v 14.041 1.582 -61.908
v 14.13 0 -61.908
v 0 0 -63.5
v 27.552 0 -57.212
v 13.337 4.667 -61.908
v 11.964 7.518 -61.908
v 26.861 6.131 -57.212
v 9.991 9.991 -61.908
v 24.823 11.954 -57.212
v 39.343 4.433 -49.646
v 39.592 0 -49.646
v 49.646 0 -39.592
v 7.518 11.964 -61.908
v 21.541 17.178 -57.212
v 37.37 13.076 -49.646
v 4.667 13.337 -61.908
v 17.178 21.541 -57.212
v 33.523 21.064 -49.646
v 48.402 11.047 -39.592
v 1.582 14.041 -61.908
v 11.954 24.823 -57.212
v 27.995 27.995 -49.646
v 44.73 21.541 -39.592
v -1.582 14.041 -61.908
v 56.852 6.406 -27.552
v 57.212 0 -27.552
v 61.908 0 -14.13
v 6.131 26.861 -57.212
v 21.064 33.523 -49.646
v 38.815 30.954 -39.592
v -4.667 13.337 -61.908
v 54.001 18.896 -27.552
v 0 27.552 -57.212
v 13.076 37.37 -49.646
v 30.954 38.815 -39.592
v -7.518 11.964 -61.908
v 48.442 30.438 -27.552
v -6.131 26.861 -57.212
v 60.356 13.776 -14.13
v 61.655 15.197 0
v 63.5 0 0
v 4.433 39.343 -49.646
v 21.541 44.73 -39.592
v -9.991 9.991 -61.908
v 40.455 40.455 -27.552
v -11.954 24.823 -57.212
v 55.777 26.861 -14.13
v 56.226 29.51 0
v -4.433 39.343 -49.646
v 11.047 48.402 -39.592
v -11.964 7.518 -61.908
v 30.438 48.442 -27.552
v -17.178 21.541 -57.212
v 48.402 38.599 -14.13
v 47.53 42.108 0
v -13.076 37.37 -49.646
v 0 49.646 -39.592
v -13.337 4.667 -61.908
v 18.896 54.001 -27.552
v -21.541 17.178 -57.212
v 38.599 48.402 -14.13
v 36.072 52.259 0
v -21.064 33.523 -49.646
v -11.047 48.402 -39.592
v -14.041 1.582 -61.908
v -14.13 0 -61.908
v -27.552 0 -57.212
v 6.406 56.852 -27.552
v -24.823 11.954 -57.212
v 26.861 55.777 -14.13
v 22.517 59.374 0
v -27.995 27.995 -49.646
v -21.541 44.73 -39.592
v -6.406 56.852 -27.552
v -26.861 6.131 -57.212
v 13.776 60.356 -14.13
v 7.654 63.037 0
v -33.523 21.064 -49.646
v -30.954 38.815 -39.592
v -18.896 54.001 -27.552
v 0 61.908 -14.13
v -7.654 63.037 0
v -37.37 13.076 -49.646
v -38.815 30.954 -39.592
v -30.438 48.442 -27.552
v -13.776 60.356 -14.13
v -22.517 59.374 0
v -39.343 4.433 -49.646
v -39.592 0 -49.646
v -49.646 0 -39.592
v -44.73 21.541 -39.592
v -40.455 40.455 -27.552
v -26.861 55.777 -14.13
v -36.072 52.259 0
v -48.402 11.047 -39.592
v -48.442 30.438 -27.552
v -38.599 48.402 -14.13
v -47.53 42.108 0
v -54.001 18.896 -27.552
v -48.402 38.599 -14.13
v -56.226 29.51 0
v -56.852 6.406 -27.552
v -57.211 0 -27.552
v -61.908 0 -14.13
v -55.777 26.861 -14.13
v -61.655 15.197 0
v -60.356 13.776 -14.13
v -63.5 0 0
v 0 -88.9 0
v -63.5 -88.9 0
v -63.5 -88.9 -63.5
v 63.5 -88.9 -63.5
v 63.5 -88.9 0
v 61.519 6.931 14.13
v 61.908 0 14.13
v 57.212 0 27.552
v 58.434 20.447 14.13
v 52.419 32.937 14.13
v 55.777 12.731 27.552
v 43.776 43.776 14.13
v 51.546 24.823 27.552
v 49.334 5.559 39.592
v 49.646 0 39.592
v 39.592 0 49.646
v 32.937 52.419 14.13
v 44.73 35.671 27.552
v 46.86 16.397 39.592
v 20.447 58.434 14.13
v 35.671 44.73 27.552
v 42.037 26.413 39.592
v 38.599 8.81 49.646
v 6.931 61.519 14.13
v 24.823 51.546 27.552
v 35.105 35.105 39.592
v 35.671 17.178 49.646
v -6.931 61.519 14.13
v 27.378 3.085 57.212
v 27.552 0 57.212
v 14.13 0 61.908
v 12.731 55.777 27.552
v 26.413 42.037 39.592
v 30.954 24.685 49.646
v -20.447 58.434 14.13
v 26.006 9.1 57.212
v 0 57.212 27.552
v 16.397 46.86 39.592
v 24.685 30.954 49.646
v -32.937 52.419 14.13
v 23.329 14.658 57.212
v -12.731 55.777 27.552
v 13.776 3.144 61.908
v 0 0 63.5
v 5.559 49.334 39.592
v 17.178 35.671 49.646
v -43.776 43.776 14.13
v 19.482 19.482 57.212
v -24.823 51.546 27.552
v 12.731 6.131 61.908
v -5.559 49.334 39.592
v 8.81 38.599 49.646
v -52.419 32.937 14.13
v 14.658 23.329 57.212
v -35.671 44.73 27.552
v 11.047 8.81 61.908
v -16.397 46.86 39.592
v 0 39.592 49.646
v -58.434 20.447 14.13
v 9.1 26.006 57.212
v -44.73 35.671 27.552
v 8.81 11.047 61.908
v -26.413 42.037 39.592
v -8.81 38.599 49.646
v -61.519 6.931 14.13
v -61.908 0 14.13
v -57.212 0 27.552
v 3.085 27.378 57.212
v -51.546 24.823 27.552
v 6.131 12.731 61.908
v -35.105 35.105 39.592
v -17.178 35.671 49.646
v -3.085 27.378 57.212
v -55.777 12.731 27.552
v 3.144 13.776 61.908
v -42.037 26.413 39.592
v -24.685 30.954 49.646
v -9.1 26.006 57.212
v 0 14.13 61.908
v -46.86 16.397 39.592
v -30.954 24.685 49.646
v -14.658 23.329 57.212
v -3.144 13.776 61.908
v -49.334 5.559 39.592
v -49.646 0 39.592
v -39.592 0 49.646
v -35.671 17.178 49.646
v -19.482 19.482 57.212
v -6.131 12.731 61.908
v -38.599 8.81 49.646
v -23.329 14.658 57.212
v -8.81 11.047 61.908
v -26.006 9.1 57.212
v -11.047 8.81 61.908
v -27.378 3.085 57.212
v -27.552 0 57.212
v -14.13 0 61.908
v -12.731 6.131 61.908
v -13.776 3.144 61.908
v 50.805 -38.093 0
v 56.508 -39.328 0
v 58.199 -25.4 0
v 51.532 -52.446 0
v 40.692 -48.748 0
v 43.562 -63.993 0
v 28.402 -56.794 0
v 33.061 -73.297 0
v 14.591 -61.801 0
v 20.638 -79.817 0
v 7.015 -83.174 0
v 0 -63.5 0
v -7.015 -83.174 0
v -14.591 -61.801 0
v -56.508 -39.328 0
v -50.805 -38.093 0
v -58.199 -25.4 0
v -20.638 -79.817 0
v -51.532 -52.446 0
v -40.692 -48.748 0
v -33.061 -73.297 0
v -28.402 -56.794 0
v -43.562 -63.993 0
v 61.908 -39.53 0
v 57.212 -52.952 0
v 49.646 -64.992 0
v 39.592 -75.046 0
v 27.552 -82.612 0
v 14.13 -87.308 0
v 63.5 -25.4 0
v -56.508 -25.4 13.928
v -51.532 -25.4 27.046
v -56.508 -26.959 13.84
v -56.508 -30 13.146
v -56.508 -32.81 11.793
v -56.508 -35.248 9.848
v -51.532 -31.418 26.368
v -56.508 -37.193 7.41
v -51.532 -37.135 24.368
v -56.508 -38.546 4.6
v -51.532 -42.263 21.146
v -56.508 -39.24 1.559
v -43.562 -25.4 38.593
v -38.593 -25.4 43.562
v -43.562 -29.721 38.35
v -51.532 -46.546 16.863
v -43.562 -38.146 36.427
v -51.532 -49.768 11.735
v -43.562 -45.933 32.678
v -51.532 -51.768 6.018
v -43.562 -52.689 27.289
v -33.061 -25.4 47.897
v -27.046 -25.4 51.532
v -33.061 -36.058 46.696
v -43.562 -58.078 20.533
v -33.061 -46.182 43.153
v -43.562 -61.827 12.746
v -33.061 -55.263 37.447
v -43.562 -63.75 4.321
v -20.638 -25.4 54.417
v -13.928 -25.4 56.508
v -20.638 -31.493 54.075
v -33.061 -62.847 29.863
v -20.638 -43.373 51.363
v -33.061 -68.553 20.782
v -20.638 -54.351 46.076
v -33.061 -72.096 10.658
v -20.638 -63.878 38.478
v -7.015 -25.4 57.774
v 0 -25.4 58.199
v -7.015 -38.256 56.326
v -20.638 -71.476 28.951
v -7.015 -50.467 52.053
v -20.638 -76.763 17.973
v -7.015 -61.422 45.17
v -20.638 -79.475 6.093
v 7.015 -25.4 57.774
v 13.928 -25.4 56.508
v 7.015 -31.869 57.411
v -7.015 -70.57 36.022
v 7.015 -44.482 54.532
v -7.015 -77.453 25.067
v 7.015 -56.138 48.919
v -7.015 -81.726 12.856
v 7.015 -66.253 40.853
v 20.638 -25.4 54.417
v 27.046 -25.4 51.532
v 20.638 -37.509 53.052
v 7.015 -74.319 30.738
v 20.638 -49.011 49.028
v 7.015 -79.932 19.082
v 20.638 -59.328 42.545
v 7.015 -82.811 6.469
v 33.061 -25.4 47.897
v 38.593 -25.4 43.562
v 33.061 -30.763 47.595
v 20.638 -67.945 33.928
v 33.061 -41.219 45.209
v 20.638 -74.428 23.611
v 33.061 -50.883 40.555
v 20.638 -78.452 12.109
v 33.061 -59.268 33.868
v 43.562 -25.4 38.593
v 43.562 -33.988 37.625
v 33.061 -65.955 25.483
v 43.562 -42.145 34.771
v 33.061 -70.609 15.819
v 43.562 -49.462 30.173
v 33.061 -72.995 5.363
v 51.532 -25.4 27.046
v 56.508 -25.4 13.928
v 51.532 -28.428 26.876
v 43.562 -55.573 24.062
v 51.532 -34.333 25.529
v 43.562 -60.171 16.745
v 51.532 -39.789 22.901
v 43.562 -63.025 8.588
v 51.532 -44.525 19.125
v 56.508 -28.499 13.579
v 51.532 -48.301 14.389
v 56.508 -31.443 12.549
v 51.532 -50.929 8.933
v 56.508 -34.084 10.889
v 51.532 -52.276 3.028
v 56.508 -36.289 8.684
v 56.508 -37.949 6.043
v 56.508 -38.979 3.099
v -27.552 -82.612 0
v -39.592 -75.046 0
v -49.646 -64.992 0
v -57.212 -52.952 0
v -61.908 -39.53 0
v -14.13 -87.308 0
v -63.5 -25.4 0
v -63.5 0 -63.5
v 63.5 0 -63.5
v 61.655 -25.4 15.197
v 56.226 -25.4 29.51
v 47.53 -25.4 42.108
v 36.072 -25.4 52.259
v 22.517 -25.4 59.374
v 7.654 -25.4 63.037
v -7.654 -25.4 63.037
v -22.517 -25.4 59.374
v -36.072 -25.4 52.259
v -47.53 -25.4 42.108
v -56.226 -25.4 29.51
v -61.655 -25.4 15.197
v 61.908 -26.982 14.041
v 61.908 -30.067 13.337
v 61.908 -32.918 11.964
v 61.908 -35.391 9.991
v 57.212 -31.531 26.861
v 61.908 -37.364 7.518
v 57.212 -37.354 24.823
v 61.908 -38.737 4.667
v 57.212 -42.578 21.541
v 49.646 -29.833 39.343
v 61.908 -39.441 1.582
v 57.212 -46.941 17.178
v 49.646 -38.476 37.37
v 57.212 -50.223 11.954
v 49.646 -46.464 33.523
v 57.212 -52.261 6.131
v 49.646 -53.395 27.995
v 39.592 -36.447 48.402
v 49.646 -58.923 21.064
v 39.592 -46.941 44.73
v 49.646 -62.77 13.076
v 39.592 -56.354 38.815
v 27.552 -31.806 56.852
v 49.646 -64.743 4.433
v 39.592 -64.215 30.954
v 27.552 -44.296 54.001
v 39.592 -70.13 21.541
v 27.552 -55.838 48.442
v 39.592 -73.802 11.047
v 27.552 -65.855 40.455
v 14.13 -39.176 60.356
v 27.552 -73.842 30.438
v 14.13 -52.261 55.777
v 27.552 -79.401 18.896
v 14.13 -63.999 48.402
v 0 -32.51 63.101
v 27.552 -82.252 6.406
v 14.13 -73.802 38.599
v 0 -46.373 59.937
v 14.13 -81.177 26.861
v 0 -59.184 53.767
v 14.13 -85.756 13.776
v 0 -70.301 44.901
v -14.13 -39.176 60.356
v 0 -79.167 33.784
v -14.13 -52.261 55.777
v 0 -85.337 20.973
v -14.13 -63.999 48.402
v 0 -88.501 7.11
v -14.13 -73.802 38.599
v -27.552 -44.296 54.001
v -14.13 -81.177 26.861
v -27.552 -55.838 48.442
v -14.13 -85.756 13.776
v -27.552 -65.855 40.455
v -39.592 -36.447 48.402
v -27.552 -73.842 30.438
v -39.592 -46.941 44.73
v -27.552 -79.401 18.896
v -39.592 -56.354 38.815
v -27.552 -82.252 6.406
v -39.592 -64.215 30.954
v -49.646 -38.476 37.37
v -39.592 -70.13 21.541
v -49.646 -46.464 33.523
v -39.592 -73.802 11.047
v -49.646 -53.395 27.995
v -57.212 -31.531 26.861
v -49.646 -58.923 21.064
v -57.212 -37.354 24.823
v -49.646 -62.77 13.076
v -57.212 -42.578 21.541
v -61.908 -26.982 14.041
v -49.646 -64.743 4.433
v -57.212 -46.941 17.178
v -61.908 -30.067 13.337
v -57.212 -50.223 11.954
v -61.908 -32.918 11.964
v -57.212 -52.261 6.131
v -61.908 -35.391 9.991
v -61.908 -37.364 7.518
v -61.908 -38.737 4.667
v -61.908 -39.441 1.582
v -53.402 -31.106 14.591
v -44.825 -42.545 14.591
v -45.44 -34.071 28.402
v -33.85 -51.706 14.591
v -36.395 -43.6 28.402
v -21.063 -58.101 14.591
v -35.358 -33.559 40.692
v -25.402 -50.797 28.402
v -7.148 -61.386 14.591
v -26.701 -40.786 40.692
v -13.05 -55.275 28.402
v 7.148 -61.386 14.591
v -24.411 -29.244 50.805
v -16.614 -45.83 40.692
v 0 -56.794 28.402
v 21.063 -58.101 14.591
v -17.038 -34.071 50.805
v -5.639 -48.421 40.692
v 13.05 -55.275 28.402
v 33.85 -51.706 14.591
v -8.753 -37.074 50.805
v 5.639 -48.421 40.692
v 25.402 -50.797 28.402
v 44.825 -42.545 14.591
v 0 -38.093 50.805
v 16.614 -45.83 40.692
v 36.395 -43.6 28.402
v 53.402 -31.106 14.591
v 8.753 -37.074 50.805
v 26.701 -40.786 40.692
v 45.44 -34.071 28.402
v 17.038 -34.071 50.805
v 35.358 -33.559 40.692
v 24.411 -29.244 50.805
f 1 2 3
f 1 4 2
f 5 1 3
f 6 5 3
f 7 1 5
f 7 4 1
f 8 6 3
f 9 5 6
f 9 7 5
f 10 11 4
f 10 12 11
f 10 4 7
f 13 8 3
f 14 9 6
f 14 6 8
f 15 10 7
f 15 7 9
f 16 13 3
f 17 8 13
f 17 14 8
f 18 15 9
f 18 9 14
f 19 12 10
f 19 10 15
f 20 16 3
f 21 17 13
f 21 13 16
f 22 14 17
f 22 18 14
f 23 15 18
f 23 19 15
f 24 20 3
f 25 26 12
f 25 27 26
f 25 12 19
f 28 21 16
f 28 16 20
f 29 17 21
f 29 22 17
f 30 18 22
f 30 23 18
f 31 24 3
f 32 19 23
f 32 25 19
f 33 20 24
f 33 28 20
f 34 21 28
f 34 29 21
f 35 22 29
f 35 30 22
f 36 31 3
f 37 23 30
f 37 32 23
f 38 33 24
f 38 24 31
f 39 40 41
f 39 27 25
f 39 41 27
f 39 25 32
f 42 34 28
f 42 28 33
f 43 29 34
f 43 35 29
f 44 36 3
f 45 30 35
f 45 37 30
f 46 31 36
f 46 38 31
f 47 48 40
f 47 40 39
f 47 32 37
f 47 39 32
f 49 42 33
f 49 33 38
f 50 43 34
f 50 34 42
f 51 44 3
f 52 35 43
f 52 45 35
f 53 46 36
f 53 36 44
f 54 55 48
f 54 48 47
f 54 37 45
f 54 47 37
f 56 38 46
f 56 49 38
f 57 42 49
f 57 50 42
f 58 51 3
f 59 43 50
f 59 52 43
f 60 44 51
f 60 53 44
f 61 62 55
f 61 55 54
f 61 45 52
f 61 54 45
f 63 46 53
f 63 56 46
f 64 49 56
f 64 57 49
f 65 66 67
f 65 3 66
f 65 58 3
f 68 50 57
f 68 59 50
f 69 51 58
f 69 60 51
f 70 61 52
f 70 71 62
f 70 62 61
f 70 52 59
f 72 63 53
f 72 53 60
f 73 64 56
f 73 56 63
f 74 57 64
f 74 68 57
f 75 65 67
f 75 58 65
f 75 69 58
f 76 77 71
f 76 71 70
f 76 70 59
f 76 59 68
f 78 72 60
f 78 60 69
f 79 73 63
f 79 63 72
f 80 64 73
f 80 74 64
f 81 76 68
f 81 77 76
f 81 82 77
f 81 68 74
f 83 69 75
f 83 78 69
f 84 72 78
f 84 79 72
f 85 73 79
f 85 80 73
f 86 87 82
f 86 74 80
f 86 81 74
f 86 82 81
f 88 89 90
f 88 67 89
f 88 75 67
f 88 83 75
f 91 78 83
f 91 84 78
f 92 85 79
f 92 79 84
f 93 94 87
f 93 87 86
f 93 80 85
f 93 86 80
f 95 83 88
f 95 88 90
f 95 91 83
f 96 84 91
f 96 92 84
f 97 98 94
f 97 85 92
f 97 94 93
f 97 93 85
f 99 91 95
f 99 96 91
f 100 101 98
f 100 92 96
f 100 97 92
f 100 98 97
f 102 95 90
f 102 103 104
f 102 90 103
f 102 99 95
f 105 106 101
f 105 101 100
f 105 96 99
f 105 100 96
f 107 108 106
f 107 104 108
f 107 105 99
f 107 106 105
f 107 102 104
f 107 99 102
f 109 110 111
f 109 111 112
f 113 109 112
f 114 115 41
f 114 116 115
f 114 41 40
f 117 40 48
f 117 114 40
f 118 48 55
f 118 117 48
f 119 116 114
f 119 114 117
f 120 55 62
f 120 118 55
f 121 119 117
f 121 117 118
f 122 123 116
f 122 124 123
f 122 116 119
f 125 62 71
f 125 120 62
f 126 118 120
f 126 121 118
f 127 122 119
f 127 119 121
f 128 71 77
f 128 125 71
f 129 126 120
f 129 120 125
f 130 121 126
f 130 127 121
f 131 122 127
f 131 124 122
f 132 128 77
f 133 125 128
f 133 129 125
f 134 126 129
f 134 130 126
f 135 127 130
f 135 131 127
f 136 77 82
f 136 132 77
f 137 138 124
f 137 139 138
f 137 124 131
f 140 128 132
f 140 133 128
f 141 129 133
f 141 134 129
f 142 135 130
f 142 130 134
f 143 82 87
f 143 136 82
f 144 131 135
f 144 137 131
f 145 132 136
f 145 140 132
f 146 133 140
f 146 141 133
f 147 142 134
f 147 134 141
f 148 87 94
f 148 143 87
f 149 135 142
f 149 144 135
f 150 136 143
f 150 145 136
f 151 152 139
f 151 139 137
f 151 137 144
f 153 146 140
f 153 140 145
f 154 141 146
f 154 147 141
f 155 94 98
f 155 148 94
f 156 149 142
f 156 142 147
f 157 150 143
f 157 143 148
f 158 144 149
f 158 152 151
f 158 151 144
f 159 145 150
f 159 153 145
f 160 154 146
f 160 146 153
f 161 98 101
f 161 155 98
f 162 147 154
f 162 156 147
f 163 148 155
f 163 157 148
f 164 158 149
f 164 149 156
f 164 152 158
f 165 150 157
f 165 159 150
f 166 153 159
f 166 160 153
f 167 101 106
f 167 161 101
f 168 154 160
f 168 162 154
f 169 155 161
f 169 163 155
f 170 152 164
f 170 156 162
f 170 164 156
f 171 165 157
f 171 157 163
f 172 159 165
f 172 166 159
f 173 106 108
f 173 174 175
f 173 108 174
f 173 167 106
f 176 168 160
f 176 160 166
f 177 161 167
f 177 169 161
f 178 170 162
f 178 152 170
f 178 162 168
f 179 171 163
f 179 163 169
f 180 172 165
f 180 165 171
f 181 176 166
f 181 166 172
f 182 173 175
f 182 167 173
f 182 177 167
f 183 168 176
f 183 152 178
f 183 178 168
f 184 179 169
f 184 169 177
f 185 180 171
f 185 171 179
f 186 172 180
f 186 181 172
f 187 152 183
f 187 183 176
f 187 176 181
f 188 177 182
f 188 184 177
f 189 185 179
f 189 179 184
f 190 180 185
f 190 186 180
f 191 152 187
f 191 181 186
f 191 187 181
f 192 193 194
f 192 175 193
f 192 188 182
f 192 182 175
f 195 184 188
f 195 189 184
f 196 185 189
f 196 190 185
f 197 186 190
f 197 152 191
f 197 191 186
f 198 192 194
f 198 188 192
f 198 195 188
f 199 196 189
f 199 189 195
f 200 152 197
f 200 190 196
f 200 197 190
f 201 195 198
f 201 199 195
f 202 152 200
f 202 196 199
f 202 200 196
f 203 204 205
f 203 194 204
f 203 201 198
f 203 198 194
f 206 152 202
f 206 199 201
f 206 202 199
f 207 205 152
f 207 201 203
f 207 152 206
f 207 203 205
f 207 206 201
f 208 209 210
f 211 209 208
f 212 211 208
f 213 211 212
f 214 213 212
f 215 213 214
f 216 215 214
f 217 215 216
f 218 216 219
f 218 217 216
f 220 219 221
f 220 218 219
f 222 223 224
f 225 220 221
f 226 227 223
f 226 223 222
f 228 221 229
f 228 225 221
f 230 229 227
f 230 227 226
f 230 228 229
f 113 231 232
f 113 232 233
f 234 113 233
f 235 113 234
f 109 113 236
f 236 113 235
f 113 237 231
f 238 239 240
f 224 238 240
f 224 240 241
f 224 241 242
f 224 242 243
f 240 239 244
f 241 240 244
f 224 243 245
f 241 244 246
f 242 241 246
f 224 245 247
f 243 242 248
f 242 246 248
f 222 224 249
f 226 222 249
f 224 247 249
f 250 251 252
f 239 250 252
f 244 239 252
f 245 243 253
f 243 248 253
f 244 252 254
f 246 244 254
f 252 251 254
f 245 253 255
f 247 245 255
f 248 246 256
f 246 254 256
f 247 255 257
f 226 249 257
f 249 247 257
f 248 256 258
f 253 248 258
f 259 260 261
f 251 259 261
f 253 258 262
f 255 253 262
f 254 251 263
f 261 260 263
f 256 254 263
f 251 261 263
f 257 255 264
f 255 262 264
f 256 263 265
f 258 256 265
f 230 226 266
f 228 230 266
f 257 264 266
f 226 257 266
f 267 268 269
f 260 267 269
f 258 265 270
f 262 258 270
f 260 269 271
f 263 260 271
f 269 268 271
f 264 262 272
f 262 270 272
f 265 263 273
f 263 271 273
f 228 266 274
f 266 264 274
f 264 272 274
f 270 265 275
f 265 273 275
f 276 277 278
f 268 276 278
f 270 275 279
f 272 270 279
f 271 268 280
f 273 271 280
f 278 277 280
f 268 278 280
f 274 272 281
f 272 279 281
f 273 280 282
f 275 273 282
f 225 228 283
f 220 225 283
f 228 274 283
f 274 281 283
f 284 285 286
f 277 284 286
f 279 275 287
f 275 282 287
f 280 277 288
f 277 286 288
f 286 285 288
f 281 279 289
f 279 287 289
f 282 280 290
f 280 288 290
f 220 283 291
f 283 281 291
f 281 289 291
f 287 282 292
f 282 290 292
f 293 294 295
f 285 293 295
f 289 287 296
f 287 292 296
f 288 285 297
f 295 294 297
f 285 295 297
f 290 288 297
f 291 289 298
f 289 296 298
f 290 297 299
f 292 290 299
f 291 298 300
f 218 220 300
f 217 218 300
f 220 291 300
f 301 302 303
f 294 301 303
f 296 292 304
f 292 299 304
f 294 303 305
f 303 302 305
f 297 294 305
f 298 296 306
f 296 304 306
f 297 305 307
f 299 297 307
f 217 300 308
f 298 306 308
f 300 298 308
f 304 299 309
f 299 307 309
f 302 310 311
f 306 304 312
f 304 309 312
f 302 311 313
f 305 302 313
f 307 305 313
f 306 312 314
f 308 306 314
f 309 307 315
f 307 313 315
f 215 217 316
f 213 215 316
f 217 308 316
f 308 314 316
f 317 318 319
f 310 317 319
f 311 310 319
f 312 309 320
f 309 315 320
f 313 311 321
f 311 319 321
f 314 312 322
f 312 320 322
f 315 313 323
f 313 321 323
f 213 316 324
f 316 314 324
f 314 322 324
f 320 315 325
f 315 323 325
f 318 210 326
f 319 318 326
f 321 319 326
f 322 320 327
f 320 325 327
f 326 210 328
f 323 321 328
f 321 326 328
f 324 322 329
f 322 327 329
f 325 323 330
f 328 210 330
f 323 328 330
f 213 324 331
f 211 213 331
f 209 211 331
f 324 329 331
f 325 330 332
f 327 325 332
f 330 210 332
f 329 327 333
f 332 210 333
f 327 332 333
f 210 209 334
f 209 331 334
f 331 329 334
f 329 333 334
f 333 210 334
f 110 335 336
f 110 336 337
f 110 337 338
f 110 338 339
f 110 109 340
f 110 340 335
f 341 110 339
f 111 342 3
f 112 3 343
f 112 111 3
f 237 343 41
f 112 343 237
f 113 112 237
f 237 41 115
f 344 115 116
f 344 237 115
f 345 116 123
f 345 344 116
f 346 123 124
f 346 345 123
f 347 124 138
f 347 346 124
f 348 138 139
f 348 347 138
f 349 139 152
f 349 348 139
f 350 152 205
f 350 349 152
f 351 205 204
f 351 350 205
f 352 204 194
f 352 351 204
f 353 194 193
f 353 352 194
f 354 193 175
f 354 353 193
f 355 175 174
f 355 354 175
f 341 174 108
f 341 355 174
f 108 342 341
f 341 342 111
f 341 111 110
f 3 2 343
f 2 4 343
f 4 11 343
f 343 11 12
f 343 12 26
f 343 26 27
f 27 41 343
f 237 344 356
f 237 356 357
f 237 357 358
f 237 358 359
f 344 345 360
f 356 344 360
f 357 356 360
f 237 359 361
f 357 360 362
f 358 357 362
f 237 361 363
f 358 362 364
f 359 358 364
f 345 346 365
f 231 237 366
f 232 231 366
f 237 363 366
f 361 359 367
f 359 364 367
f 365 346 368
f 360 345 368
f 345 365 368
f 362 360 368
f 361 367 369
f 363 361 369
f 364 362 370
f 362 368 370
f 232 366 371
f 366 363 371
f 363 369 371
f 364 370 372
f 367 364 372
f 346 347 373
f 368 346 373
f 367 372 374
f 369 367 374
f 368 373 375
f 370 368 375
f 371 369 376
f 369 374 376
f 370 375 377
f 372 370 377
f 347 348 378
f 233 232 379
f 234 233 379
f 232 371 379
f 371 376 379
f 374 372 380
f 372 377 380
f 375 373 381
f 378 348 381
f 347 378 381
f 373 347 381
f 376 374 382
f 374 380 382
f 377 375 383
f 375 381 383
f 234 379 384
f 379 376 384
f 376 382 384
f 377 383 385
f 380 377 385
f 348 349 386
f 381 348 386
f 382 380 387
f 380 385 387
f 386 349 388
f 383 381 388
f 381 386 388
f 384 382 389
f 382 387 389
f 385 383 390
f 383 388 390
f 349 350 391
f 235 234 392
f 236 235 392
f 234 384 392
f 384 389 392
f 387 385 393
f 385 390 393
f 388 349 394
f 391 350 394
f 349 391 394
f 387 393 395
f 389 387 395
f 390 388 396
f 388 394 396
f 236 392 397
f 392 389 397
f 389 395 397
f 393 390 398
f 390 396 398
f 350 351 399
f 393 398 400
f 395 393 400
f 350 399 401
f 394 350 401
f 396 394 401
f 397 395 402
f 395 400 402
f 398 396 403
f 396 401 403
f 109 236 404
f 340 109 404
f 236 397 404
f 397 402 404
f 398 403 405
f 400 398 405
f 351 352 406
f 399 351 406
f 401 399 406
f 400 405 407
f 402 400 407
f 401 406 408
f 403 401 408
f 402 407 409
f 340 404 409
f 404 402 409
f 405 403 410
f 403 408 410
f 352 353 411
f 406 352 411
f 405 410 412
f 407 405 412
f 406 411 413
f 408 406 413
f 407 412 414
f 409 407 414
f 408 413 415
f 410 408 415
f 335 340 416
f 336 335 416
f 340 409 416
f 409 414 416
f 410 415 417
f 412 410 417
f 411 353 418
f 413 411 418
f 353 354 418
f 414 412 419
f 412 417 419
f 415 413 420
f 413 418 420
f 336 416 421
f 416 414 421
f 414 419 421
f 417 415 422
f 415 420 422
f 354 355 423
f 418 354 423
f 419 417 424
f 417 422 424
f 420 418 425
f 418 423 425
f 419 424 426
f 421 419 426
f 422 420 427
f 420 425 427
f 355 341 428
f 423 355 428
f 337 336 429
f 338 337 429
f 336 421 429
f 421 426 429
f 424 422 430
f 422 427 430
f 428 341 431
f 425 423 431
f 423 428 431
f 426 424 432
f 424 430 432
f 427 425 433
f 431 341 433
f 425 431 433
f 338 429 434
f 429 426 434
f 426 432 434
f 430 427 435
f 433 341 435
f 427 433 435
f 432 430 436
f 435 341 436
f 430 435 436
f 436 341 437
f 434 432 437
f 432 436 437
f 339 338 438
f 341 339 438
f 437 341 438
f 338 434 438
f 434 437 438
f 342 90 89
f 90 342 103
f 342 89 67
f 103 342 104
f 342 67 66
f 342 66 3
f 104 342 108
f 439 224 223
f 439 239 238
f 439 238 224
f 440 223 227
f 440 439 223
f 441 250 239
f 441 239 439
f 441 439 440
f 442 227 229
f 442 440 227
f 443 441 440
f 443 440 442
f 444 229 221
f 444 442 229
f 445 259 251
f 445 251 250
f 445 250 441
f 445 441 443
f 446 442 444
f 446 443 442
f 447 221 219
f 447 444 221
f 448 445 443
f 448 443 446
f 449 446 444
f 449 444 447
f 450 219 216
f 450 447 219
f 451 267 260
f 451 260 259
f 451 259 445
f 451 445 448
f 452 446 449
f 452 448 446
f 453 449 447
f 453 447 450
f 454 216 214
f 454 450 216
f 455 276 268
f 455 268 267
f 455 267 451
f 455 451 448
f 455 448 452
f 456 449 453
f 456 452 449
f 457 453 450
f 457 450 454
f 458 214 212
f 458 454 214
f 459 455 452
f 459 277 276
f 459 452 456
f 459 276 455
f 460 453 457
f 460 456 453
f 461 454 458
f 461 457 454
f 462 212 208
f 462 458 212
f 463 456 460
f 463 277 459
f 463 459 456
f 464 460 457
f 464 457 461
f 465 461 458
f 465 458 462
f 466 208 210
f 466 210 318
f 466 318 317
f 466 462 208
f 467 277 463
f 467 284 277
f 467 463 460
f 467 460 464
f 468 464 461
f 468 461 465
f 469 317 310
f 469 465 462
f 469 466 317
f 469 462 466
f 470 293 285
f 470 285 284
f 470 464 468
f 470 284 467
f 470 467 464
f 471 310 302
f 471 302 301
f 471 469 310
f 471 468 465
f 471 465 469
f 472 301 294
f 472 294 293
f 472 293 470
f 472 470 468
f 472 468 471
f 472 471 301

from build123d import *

# Parameters (mm, degrees)
F4_DEPTH = 25.4
F5_ANGLE = 90
F7_W     = 63.5
F7_H     = 63.5
F8_DEPTH = 88.9


with BuildPart() as f1:
    # F0 (on Front) → F1 (revolve)
    with BuildSketch(Plane.XZ):
        with BuildLine():
            Line((0, 63.5), (0, -63.5))
            ThreePointArc((0, -63.5), (44.9012806053, -44.9012806053), (63.5, 0))
            ThreePointArc((63.5, 0), (44.9012806053, 44.9012806053), (0, 63.5))
        make_face()
    revolve(axis=Axis((0, 0, 5.784236908), (0, 0, 1)))

    # F3 (on offset) → F4 (join)
    with BuildSketch(Plane.XZ.offset(25.4)):
        with BuildLine():
            Line((-63.5, 0), (63.5, 0))
            ThreePointArc((63.5, 0), (0, 63.5), (-63.5, 0))
        make_face()
    extrude(amount=-F4_DEPTH)

    # F4_face (on face) → F5 (revolve)
    with BuildSketch(Plane(origin=(0, -25.4, 38.7624051915), x_dir=(1, 0, 0), z_dir=(0, -1, 0))):
        with BuildLine():
            ThreePointArc((63.5, -38.7624051915), (0, 24.7375948085), (-63.5, -38.7624051915))
            Line((-63.5, -38.7624051915), (-58.1987113259, -38.7624051915))
            ThreePointArc((-58.1987113259, -38.7624051915), (0, 19.4363061344), (58.1987113259, -38.7624051915))
            Line((58.1987113259, -38.7624051915), (63.5, -38.7624051915))
        make_face()
    revolve(axis=Axis((-60.849355663, -25.4, 0), (1, 0, 0)), revolution_arc=F5_ANGLE)

    # F7 (on offset) → F8 (join)
    with BuildSketch(Plane.XZ.offset(88.9)):
        with Locations((-31.75, -31.75)):
            Rectangle(F7_W, F7_H)
        with Locations((31.75, -31.75)):
            Rectangle(F7_W, F7_H)
    extrude(amount=-F8_DEPTH)


solid = f1.part
